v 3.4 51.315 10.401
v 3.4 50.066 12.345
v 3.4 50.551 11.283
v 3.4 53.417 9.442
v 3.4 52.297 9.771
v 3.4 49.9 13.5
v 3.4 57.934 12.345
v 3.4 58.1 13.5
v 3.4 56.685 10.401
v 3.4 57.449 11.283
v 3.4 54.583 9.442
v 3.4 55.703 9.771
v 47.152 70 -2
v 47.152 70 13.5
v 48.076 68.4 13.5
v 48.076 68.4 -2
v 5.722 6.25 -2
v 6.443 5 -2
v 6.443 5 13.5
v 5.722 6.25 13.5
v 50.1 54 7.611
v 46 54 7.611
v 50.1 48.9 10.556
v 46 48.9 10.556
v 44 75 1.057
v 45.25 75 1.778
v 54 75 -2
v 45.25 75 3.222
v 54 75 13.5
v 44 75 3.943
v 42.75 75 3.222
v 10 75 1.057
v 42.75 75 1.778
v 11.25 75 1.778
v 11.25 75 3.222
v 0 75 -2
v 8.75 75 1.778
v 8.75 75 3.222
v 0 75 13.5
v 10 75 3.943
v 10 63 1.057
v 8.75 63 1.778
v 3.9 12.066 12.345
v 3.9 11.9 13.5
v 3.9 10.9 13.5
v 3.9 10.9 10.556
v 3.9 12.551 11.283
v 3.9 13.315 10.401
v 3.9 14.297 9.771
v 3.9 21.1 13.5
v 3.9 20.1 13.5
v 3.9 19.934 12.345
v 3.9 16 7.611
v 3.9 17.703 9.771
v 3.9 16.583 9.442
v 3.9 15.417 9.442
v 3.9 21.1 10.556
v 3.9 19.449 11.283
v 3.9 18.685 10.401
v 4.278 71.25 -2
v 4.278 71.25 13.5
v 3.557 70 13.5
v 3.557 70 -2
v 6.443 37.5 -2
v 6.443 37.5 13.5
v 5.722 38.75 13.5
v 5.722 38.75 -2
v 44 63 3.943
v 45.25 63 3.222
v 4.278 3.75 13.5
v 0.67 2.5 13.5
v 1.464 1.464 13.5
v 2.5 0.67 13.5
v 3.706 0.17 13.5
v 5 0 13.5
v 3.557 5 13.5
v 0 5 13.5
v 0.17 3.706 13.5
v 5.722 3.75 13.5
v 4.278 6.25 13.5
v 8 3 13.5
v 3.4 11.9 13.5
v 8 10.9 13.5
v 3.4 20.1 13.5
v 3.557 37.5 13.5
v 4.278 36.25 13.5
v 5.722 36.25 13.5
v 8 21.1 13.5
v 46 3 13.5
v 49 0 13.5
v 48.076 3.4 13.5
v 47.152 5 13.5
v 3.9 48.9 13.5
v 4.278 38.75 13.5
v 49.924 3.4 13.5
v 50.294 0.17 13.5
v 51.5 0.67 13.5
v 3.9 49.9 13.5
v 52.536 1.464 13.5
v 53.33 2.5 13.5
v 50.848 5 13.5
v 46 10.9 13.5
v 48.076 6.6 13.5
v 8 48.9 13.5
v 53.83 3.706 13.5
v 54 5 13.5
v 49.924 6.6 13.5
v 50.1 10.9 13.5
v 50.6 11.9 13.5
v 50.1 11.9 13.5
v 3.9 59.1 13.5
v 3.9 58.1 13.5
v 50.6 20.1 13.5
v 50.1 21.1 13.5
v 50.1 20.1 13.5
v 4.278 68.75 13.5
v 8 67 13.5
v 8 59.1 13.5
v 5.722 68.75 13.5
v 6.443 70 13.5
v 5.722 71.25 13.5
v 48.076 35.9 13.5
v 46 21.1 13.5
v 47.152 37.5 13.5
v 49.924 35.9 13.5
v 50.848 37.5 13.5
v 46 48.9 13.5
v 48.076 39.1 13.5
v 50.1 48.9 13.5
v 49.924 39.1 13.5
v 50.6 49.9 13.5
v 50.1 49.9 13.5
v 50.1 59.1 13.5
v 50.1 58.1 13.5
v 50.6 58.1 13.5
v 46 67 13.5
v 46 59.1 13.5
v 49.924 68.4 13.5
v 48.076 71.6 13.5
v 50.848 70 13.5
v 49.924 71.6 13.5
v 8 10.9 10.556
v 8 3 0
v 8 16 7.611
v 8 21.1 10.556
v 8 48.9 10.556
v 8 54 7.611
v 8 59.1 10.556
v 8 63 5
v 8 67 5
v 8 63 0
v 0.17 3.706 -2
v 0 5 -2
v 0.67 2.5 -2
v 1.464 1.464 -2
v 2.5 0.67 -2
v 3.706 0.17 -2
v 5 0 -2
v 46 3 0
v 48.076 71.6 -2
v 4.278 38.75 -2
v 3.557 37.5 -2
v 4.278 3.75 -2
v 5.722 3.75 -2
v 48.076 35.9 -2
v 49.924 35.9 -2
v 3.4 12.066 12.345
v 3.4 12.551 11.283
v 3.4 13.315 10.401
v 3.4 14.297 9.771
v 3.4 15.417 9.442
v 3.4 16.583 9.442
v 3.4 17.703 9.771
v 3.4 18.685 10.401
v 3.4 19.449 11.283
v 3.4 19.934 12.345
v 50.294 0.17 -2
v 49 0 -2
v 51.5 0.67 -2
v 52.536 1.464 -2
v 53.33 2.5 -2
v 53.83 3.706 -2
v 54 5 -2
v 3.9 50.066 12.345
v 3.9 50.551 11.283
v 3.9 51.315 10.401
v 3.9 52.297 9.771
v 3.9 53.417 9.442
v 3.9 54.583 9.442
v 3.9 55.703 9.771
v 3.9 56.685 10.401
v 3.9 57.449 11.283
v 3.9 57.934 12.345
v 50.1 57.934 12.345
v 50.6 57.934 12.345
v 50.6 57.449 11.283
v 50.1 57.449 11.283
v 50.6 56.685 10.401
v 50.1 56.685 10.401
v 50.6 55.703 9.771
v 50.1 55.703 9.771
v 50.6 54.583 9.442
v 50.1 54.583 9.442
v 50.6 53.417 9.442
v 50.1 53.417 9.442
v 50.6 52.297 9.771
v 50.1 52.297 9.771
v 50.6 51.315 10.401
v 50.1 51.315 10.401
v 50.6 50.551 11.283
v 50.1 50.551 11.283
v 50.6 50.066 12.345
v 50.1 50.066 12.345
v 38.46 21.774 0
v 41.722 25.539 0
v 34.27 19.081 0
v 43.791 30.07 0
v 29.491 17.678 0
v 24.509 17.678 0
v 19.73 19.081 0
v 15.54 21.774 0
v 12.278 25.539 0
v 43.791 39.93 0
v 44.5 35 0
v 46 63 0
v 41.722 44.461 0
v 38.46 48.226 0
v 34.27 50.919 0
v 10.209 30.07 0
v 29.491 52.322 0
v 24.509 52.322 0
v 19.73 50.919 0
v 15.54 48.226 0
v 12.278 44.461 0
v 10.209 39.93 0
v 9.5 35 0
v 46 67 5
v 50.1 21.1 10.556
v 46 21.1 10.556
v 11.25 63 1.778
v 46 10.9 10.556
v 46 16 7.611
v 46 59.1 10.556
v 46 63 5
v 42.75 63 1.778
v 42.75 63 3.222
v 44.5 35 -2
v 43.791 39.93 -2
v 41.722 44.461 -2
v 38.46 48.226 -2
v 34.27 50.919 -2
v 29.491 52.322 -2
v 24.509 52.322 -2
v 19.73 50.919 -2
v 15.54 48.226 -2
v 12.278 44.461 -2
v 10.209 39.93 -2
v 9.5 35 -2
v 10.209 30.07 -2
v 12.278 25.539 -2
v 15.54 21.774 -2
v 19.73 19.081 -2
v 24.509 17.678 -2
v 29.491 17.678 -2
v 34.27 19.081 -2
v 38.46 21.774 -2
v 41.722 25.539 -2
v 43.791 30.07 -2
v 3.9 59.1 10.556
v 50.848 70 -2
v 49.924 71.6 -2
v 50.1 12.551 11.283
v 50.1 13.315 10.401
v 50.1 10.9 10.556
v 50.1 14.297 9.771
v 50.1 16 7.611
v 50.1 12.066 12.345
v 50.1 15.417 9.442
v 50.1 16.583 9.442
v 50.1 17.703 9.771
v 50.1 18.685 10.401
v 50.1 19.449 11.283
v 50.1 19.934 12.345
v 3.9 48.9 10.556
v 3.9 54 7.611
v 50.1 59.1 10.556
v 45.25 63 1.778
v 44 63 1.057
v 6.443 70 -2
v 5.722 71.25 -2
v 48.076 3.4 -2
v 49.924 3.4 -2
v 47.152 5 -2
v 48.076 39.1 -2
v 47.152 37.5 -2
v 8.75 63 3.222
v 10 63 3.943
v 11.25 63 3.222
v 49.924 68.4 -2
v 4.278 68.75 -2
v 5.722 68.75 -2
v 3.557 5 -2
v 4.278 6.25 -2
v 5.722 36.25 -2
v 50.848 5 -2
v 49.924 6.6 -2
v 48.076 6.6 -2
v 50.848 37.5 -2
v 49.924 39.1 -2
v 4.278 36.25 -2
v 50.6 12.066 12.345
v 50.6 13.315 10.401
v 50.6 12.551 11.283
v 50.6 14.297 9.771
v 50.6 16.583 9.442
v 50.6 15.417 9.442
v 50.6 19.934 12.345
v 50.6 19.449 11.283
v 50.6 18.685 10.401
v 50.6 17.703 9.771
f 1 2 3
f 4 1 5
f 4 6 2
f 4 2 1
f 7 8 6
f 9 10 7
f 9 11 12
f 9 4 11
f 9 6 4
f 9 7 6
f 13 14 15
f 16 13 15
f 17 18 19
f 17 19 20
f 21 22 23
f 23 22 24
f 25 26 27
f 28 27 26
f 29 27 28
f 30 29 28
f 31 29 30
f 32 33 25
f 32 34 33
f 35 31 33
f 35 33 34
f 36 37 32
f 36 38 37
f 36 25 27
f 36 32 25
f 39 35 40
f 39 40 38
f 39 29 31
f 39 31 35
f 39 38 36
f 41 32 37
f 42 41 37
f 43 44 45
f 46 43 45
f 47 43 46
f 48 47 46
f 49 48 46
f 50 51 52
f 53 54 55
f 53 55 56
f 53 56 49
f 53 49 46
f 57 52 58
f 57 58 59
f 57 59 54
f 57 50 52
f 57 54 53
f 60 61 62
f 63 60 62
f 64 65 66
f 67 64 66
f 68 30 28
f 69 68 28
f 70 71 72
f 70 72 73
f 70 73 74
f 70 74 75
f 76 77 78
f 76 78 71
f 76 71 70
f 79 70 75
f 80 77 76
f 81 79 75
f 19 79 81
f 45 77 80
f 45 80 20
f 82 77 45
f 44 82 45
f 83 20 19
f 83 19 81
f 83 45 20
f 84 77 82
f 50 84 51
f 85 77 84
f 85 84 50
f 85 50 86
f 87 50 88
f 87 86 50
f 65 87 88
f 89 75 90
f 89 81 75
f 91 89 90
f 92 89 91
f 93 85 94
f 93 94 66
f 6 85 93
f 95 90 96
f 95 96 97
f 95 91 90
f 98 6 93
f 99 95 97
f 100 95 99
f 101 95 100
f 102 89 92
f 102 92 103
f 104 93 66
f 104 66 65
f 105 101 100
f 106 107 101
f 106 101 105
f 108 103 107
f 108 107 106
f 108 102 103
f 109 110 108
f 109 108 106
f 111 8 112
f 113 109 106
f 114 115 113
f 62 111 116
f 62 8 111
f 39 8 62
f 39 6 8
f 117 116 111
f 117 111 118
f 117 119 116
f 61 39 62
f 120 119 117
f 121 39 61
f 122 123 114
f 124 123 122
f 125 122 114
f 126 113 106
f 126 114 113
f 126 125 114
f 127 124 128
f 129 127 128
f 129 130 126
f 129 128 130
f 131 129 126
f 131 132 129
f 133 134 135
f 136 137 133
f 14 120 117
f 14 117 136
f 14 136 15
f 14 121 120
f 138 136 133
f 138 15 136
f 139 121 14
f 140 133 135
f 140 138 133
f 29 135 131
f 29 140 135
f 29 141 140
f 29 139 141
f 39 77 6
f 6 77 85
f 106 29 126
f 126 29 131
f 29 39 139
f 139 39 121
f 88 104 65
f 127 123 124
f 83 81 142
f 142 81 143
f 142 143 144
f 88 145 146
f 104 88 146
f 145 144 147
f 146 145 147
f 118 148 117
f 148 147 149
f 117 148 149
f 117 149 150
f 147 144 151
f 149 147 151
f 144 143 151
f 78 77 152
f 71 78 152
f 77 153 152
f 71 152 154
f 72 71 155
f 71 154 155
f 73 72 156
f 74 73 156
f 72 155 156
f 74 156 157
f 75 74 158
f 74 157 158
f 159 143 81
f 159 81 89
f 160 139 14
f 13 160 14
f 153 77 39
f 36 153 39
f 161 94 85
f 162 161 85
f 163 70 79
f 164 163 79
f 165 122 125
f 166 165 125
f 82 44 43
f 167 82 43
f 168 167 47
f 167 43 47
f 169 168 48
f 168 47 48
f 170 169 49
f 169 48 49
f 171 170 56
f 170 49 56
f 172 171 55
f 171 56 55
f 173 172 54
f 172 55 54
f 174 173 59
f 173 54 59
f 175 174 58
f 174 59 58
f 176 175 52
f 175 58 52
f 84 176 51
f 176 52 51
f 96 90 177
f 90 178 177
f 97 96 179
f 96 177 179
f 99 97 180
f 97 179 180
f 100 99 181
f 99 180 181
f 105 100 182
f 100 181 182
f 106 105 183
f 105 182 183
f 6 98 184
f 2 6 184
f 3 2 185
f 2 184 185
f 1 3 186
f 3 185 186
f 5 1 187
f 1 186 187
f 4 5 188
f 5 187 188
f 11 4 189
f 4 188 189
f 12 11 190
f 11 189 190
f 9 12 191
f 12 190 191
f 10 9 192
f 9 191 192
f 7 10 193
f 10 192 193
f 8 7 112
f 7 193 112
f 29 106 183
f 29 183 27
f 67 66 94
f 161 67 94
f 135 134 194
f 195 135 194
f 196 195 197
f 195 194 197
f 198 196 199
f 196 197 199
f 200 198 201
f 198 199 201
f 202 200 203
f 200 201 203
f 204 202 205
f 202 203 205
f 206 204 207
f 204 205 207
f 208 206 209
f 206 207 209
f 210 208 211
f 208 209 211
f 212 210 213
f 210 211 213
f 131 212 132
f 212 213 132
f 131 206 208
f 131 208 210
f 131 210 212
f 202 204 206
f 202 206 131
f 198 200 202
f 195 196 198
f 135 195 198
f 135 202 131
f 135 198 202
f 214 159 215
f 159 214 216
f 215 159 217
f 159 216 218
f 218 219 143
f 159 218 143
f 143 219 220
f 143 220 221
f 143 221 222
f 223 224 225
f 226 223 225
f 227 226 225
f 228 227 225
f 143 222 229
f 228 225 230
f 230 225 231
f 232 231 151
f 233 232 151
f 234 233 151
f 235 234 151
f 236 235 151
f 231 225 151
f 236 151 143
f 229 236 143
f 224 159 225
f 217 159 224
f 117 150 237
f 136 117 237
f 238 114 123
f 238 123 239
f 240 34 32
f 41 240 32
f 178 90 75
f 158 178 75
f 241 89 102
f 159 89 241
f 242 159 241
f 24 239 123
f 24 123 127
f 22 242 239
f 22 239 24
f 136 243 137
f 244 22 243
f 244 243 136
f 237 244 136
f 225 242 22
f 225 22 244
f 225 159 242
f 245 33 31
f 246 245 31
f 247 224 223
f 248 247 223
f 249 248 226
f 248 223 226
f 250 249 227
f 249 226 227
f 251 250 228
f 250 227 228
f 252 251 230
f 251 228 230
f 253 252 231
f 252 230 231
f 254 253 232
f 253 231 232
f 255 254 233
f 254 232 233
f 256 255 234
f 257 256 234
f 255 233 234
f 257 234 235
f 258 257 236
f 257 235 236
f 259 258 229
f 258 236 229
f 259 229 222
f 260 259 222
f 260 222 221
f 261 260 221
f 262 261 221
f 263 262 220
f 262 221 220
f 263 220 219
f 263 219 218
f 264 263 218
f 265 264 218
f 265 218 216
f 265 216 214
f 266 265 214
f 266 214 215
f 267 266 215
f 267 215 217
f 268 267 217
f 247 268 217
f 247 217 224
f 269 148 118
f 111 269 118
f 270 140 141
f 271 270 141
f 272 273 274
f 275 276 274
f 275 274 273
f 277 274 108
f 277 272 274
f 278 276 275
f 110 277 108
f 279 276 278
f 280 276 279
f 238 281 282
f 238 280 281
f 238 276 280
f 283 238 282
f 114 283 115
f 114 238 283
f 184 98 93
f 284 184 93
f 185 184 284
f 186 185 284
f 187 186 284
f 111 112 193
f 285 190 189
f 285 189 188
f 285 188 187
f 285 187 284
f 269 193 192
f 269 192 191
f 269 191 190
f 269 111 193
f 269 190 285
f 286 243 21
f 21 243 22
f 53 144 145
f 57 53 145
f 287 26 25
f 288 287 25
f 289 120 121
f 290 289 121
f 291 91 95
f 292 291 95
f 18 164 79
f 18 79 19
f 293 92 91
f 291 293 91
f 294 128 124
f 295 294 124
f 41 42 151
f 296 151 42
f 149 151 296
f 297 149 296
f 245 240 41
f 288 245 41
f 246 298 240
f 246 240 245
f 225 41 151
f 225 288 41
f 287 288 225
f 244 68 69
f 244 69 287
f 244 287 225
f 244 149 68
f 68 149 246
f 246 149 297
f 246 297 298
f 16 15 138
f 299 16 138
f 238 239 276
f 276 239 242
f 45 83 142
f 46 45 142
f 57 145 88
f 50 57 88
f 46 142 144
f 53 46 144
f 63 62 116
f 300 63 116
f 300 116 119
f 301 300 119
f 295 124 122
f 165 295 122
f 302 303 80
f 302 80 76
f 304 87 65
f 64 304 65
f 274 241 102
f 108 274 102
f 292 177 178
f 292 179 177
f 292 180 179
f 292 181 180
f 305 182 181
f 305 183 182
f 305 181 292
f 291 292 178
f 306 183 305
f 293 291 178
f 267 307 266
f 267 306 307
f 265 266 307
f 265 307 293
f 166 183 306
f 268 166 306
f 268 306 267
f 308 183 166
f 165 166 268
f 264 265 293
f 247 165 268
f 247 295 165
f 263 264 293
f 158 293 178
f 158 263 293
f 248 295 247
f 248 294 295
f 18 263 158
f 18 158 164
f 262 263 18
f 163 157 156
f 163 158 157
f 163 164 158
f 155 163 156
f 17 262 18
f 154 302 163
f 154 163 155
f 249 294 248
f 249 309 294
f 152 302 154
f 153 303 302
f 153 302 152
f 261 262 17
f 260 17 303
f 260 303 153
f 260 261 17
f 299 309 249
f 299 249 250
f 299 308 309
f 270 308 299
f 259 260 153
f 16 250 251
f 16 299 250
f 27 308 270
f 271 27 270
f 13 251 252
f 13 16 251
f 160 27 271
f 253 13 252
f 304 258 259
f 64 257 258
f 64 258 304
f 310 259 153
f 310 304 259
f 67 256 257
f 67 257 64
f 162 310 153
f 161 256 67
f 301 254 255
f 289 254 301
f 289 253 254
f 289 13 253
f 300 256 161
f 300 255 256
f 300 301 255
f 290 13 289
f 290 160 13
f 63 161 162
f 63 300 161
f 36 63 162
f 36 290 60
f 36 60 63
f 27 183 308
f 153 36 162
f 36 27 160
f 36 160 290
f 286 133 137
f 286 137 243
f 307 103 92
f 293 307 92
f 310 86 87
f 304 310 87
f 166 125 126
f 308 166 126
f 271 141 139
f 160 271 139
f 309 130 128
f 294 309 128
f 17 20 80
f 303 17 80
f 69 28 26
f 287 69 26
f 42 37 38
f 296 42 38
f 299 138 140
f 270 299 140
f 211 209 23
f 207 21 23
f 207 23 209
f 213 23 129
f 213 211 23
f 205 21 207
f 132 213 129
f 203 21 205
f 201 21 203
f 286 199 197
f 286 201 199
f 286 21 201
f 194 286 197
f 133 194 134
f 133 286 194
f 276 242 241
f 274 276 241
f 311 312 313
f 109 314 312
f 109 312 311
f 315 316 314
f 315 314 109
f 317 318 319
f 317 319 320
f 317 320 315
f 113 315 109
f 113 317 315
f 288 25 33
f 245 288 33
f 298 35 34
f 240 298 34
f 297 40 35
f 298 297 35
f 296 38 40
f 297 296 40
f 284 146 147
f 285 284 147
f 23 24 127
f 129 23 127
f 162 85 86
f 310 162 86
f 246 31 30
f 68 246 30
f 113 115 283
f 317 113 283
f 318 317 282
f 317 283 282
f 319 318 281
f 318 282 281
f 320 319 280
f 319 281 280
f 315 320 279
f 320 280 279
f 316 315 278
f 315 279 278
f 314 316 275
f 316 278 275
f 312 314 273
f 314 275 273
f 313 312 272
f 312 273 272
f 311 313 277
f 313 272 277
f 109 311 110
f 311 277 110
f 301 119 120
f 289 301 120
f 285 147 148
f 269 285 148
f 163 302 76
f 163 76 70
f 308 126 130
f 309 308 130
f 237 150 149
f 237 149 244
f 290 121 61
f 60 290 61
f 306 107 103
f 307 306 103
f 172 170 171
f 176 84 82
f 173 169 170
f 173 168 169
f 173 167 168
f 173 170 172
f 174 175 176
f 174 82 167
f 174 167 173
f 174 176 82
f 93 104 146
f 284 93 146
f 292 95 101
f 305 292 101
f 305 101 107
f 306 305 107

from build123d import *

# Parameters (mm, degrees)
SKETCH1_W           = 54
SKETCH1_H           = 75
SKETCH1_W_2         = 38
SKETCH1_H_2         = 64
BOSS_EXTRUDE1_DEPTH = 27
CUT_EXTRUDE1_DEPTH  = 4.1
SKETCH5_R           = 4.1
CUT_EXTRUDE2_DEPTH  = 0.5
CUT_EXTRUDE3_DEPTH  = 4.1
SKETCH7_R           = 4.1
CUT_EXTRUDE4_DEPTH  = 0.5
SKETCH8_W           = 54
SKETCH8_H           = 75
BOSS_EXTRUDE2_DEPTH = 2
SKETCH9_W           = 54
SKETCH9_H           = 75
BOSS_EXTRUDE3_DEPTH = 2
SKETCH10_W          = 54
SKETCH10_H          = 75
CUT_EXTRUDE5_DEPTH  = 15.5
SKETCH11_R          = 17.5
CUT_EXTRUDE6_DEPTH  = 3
CUT_EXTRUDE7_DEPTH  = 16.5
SKETCH14_W          = 38
SKETCH14_H          = 5
BOSS_EXTRUDE4_DEPTH = 4
CUT_EXTRUDE8_REACH  = 77
FILLET1_R           = 5


with BuildPart() as part:
    # Sketch1 → Boss-Extrude1 (new body)
    with BuildSketch(Plane.XY):
        with Locations((27, 37.5)):
            Rectangle(SKETCH1_W, SKETCH1_H)
        with Locations((27, 35)):
            Rectangle(SKETCH1_W_2, SKETCH1_H_2, mode=Mode.SUBTRACT)
    extrude(amount=BOSS_EXTRUDE1_DEPTH)

    # Sketch2 → Cut-Extrude1 (cut)
    with BuildSketch(Plane.ZY.offset(-46)):
        Polygon((19.388972746, 54), (16.444486373, 59.1), (10.555513627, 59.1), (7.611027254, 54), (10.555513627, 48.9), (16.444486373, 48.9), align=None)
        Polygon((19.388972746, 16), (16.444486373, 21.1), (10.555513627, 21.1), (7.611027254, 16), (10.555513627, 10.9), (16.444486373, 10.9), align=None)
    extrude(amount=-CUT_EXTRUDE1_DEPTH, mode=Mode.SUBTRACT)

    # Sketch5 → Cut-Extrude2 (cut)
    with BuildSketch(Plane.ZY.offset(-50.1)):
        with Locations((13.5, 54)):
            Circle(SKETCH5_R)
        with Locations((13.5, 16)):
            Circle(SKETCH5_R)
    extrude(amount=-CUT_EXTRUDE2_DEPTH, mode=Mode.SUBTRACT)

    # Sketch6 → Cut-Extrude3 (cut)
    with BuildSketch(Plane(origin=(8, 0, 0), x_dir=(0, 0, -1), z_dir=(1, 0, 0))):
        Polygon((-7.611027254, 54), (-10.555513627, 59.1), (-16.444486373, 59.1), (-19.388972746, 54), (-16.444486373, 48.9), (-10.555513627, 48.9), align=None)
        Polygon((-7.611027254, 16), (-10.555513627, 21.1), (-16.444486373, 21.1), (-19.388972746, 16), (-16.444486373, 10.9), (-10.555513627, 10.9), align=None)
    extrude(amount=-CUT_EXTRUDE3_DEPTH, mode=Mode.SUBTRACT)

    # Sketch7 → Cut-Extrude4 (cut)
    with BuildSketch(Plane(origin=(3.9, 0, 0), x_dir=(0, 0, -1), z_dir=(1, 0, 0))):
        with Locations((-13.5, 54)):
            Circle(SKETCH7_R)
        with Locations((-13.5, 16)):
            Circle(SKETCH7_R)
    extrude(amount=-CUT_EXTRUDE4_DEPTH, mode=Mode.SUBTRACT)

    # Sketch8 → Boss-Extrude2 (add)
    with BuildSketch(Plane.XY.offset(27)):
        with Locations((27, 37.5)):
            Rectangle(SKETCH8_W, SKETCH8_H)
    extrude(amount=BOSS_EXTRUDE2_DEPTH)

    # Sketch9 → Boss-Extrude3 (add)
    with BuildSketch(Plane(origin=(0, 0, 0), x_dir=(-1, 0, 0), z_dir=(0, 0, -1))):
        with Locations((-27, 37.5)):
            Rectangle(SKETCH9_W, SKETCH9_H)
    extrude(amount=BOSS_EXTRUDE3_DEPTH)

    # Sketch10 → Cut-Extrude5 (cut)
    with BuildSketch(Plane.XY.offset(29)):
        with Locations((27, 37.5)):
            Rectangle(SKETCH10_W, SKETCH10_H)
    extrude(amount=-CUT_EXTRUDE5_DEPTH, mode=Mode.SUBTRACT)

    # Sketch11 → Cut-Extrude6 (cut, through all)
    with BuildSketch(Plane.XY):
        with Locations((27, 35)):
            Circle(SKETCH11_R)
    extrude(amount=-CUT_EXTRUDE6_DEPTH, mode=Mode.SUBTRACT)

    # Sketch12 → Cut-Extrude7 (cut, through all)
    with BuildSketch(Plane.XY.offset(13.5)):
        Polygon((6.443375673, 70), (5.721687836, 71.25), (4.278312164, 71.25), (3.556624327, 70), (4.278312164, 68.75), (5.721687836, 68.75), align=None)
        Polygon((50.847520861, 70), (49.923760431, 71.6), (48.076239569, 71.6), (47.152479139, 70), (48.076239569, 68.4), (49.923760431, 68.4), align=None)
        Polygon((6.443375673, 5), (5.721687836, 6.25), (4.278312164, 6.25), (3.556624327, 5), (4.278312164, 3.75), (5.721687836, 3.75), align=None)
        Polygon((50.847520861, 5), (49.923760431, 6.6), (48.076239569, 6.6), (47.152479139, 5), (48.076239569, 3.4), (49.923760431, 3.4), align=None)
        Polygon((50.847520861, 37.5), (49.923760431, 39.1), (48.076239569, 39.1), (47.152479139, 37.5), (48.076239569, 35.9), (49.923760431, 35.9), align=None)
        Polygon((6.443375673, 37.5), (5.721687836, 38.75), (4.278312164, 38.75), (3.556624327, 37.5), (4.278312164, 36.25), (5.721687836, 36.25), align=None)
    extrude(amount=-CUT_EXTRUDE7_DEPTH, mode=Mode.SUBTRACT)

    # Sketch14 → Boss-Extrude4 (add)
    with BuildSketch(Plane.XZ.offset(-67)):
        with Locations((27, 2.5)):
            Rectangle(SKETCH14_W, SKETCH14_H)
    extrude(amount=BOSS_EXTRUDE4_DEPTH)

    # Sketch13 → Cut-Extrude8 (cut, up to next)
    with BuildSketch(Plane(origin=(0, 75, 0), x_dir=(1, 0, 0), z_dir=(0, 1, 0)), mode=Mode.PRIVATE) as cut_extrude8_sk1:
        Polygon((44, -1.056624327), (42.75, -1.778312164), (42.75, -3.221687836), (44, -3.943375673), (45.25, -3.221687836), (45.25, -1.778312164), align=None)
    cut_extrude8_tool1 = extrude(cut_extrude8_sk1.sketch, amount=-CUT_EXTRUDE8_REACH, mode=Mode.PRIVATE) & part.part
    add(cut_extrude8_tool1.solids().sort_by_distance((44, 75, 2.5))[0], mode=Mode.SUBTRACT)
    # Sketch13 → Cut-Extrude8 (cut, up to next)
    with BuildSketch(Plane(origin=(0, 75, 0), x_dir=(1, 0, 0), z_dir=(0, 1, 0)), mode=Mode.PRIVATE) as cut_extrude8_sk2:
        Polygon((10, -1.056624327), (8.75, -1.778312164), (8.75, -3.221687836), (10, -3.943375673), (11.25, -3.221687836), (11.25, -1.778312164), align=None)
    cut_extrude8_tool2 = extrude(cut_extrude8_sk2.sketch, amount=-CUT_EXTRUDE8_REACH, mode=Mode.PRIVATE) & part.part
    add(cut_extrude8_tool2.solids().sort_by_distance((10, 75, 2.5))[0], mode=Mode.SUBTRACT)

    # Fillet1
    fillet1_edges = [part.edges().sort_by_distance(p)[0] for p in [
        (0, 0, 5.75),
        (54, 0, 5.75),
    ]]
    fillet(fillet1_edges, radius=FILLET1_R)


solid = part.part
